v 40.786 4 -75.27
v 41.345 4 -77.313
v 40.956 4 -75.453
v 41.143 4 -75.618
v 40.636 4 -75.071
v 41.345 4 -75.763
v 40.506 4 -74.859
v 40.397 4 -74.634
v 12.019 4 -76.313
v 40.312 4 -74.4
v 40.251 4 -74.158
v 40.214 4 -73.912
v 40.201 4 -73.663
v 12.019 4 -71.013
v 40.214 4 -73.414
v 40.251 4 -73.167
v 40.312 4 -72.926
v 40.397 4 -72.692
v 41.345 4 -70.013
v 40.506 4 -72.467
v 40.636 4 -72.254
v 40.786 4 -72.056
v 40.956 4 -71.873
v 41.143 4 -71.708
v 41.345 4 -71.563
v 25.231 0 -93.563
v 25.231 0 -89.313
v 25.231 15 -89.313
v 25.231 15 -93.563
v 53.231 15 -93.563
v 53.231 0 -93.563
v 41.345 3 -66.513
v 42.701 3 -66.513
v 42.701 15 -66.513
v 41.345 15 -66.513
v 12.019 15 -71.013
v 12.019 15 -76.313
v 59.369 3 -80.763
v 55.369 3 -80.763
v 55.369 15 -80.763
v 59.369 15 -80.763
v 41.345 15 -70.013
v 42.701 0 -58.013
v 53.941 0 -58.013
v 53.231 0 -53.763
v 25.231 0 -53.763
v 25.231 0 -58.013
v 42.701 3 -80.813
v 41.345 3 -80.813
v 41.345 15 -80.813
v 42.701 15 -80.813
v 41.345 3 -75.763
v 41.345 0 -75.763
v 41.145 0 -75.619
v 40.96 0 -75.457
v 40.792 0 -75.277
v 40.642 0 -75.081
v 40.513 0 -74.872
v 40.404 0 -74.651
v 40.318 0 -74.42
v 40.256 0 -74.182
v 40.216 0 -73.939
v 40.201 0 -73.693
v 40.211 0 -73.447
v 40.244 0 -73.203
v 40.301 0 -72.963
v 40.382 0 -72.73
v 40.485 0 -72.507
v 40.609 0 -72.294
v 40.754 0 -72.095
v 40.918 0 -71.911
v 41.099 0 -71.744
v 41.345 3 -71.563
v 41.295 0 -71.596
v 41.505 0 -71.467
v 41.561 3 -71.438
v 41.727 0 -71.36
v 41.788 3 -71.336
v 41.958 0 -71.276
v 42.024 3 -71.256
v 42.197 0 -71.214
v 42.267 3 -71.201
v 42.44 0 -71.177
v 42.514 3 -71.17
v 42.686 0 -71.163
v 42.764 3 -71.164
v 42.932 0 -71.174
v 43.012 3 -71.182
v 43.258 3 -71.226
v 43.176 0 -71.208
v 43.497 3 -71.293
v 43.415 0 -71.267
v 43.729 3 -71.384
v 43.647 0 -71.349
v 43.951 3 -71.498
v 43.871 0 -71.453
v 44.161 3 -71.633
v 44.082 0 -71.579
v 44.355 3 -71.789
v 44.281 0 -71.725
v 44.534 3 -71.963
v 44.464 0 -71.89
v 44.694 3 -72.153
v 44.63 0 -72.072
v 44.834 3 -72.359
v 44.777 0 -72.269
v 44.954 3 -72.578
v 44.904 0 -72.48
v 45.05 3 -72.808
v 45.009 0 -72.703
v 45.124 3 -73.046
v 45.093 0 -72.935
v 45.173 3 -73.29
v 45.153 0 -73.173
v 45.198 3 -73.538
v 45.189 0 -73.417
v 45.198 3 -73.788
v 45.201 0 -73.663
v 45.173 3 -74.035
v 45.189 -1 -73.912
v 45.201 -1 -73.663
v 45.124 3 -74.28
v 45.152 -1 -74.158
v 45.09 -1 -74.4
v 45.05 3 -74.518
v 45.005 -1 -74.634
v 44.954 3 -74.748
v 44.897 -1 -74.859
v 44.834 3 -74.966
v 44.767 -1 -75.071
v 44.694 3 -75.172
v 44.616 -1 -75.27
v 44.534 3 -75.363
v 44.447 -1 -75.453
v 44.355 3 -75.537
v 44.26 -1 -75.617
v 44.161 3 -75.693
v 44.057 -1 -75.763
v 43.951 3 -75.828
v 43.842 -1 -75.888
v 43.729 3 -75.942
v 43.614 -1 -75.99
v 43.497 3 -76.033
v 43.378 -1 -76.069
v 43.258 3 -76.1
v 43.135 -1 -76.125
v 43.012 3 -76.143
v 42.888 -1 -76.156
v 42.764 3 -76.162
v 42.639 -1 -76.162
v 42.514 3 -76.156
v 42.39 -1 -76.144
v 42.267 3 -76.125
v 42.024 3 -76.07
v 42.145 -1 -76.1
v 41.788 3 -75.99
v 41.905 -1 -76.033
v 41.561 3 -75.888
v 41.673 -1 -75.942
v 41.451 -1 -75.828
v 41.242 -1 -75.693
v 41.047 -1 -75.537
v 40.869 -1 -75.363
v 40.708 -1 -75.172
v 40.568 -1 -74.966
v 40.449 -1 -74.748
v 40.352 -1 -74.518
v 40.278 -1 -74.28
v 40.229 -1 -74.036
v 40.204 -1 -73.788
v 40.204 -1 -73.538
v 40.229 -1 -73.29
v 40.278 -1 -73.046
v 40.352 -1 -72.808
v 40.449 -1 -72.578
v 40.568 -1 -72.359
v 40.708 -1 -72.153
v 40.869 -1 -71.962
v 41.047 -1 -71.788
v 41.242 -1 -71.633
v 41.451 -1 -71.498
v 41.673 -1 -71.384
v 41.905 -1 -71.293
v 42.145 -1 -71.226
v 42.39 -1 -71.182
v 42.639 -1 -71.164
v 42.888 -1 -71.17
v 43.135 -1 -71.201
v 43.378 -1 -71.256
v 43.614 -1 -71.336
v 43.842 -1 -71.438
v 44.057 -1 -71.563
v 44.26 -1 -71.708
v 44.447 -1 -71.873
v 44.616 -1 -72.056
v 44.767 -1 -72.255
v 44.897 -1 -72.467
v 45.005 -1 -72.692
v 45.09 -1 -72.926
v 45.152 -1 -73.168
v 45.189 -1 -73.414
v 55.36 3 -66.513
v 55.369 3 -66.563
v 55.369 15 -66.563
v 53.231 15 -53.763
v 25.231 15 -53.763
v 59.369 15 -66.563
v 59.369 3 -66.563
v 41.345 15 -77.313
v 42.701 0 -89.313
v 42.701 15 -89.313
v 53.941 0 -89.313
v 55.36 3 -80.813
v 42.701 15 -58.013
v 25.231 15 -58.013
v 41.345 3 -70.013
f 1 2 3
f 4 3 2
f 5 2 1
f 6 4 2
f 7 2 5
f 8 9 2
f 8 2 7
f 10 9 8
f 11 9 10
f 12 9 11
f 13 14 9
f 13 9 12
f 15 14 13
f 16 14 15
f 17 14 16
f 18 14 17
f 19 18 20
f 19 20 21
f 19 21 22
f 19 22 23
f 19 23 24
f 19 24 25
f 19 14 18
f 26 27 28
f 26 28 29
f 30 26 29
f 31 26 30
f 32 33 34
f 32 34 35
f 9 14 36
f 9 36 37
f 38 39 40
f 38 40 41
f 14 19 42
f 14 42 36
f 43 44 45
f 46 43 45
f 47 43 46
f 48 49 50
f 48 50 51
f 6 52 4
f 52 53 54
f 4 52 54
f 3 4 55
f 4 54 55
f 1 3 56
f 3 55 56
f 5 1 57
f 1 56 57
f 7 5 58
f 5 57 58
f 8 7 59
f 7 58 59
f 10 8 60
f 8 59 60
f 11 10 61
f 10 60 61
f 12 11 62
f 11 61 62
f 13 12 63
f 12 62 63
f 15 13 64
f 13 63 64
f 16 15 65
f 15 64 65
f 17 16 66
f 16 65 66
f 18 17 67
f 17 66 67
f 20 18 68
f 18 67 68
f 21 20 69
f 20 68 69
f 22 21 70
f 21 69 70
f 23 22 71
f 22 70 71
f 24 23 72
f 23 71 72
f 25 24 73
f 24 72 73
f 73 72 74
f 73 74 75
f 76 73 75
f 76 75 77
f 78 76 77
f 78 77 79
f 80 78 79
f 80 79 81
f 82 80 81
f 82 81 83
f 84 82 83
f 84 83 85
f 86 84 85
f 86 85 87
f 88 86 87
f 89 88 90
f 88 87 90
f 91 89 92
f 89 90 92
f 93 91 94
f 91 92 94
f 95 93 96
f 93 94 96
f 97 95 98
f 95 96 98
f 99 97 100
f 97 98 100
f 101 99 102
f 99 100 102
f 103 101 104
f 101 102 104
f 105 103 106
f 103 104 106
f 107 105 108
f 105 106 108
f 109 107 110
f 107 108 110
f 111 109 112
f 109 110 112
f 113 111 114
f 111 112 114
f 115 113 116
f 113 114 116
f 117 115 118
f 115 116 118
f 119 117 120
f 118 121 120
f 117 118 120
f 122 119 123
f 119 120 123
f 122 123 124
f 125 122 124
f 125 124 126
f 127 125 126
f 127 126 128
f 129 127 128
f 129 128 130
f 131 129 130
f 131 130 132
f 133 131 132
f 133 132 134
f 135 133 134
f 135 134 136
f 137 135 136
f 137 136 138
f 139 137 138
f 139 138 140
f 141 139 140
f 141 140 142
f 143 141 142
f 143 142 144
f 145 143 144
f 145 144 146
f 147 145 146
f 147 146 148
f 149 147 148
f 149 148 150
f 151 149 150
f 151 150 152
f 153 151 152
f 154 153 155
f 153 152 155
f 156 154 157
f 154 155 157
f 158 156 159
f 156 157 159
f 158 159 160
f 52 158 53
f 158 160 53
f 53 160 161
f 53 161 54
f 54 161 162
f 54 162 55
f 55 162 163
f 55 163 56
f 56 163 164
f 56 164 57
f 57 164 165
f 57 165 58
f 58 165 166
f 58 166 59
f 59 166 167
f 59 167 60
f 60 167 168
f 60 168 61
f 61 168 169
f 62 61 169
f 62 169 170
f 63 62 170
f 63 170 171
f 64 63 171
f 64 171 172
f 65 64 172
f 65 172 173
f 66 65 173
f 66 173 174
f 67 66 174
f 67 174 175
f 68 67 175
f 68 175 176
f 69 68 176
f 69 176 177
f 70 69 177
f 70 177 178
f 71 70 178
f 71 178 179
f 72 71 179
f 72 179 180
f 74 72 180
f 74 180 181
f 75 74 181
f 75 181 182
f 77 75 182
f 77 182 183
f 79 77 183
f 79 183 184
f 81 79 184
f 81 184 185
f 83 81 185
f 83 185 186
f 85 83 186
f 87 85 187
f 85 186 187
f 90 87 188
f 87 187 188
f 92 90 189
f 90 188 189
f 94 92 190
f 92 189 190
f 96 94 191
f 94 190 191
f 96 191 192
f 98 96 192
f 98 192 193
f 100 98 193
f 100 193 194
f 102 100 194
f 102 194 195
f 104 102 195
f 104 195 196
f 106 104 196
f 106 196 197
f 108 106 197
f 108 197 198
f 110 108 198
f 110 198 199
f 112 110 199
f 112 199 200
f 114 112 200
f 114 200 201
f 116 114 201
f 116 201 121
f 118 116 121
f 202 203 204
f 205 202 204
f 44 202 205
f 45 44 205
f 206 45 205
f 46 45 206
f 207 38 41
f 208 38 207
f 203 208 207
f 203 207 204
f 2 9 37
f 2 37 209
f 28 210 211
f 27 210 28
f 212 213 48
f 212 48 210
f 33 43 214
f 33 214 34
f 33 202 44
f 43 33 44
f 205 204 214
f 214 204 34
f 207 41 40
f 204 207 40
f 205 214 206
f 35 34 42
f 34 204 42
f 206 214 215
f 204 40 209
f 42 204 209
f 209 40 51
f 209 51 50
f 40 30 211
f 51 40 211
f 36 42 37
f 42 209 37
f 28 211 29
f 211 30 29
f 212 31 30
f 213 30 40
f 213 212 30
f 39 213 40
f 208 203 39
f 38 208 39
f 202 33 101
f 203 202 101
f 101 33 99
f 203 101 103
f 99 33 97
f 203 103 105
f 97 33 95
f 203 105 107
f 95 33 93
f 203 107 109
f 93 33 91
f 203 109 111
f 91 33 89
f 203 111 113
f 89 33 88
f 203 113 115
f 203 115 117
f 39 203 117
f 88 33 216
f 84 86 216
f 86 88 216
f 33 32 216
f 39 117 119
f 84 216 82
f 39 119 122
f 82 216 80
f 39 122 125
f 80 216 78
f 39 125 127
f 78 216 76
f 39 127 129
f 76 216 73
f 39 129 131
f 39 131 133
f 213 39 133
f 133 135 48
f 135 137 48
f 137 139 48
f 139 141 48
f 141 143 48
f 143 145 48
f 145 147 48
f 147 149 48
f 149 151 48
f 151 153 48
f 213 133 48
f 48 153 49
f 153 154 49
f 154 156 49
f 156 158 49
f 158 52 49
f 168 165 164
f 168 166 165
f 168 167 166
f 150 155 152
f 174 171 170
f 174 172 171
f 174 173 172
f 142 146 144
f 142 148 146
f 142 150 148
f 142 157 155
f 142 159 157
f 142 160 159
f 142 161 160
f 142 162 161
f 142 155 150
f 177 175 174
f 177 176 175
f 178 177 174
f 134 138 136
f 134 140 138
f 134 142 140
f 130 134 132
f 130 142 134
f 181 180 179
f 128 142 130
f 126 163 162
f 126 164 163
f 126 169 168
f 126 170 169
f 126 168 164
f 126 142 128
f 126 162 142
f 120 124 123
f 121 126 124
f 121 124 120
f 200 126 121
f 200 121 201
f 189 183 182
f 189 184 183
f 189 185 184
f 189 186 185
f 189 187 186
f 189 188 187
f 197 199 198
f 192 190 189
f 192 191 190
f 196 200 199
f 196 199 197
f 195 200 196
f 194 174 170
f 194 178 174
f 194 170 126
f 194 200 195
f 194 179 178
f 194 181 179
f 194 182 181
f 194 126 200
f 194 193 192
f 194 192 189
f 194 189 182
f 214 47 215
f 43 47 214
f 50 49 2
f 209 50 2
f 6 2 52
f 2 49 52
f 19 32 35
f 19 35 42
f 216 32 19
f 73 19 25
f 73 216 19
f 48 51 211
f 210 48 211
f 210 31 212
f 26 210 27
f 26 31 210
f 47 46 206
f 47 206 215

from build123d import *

# Parameters (mm, degrees)
BOSS_EXTRUDE1_DEPTH     = 15
SKETCH2_R               = 2.5
BOSS_EXTRUDE2_DEPTH     = 1
CUT_EXTRUDE1_DEPTH      = 3
CUT_EXTRUDE5_DEPTH      = 2
CUT_EXTRUDE5_DEPTH_BACK = 3
SKETCH5_W               = 1.356176493
SKETCH5_H               = 3
CUT_EXTRUDE6_DEPTH      = 3
CUT_EXTRUDE11_DEPTH     = 20
CUT_EXTRUDE12_DEPTH     = 1


with BuildPart() as part:
    # Sketch1 → Boss-Extrude1 (new body)
    with BuildSketch(Plane(origin=(0, 0, 0), x_dir=(1, 0, 0), z_dir=(0, 1, 0))):
        Polygon((53.231444905, 93.562909441), (55.368661466, 80.762909441), (59.368661466, 80.762909441), (59.368661466, 66.562909441), (55.368661466, 66.562909441), (53.231444905, 53.762909441), (25.231444905, 53.762909441), (25.231444905, 58.012909441), (42.701133317, 58.012909441), (42.701133317, 66.512909441), (41.344956824, 66.512909441), (41.344956824, 70.012909441), (12.018661466, 71.012909441), (12.018661466, 76.312909441), (41.344956824, 77.312909441), (41.344956824, 80.812909441), (42.701133317, 80.812909441), (42.701133317, 89.312909441), (25.231444905, 89.312909441), (25.231444905, 93.562909441), align=None)
    extrude(amount=BOSS_EXTRUDE1_DEPTH)

    # Sketch2 → Boss-Extrude2 (add)
    with BuildSketch(Plane.XZ):
        with Locations((42.701133317, -73.662909441)):
            Circle(SKETCH2_R)
    extrude(amount=BOSS_EXTRUDE2_DEPTH)

    # Sketch3 → Cut-Extrude1 (cut)
    with BuildSketch(Plane(origin=(0, 0, 0), x_dir=(-1, 0, 0), z_dir=(0, -1, 0))):
        with BuildLine():
            Line((-42.701133317, 80.812909441), (-55.368661466, 80.762909441))
            Line((-55.368661466, 80.762909441), (-59.368661466, 80.762909441))
            Line((-59.368661466, 80.762909441), (-59.368661466, 66.562909441))
            Line((-59.368661466, 66.562909441), (-41.344956824, 66.512909441))
            Line((-41.344956824, 66.512909441), (-41.344956824, 70.012909441))
            Line((-41.344956824, 70.012909441), (-41.344956824, 71.562722468))
            ThreePointArc((-41.344956824, 71.562722468), (-45.201133317, 73.662909441), (-41.344956824, 75.763096414))
            Line((-41.344956824, 75.763096414), (-41.344956824, 77.312909441))
            Line((-41.344956824, 77.312909441), (-41.344956824, 80.812909441))
            Line((-41.344956824, 80.812909441), (-42.701133317, 80.812909441))
        make_face()
    extrude(amount=-CUT_EXTRUDE1_DEPTH, mode=Mode.SUBTRACT)

    # Sketch4 → Cut-Extrude5 (cut, two sides)
    with BuildSketch(Plane.XZ) as cut_extrude5_sk:
        with BuildLine():
            Line((12.018661466, -76.312909441), (41.344956824, -77.312909441))
            Line((41.344956824, -77.312909441), (41.344956824, -77.220900459))
            Line((41.344956824, -77.220900459), (41.344956824, -75.763096414))
            ThreePointArc((41.344956824, -75.763096414), (40.201133317, -73.662909441), (41.344956824, -71.562722468))
            Line((41.344956824, -71.562722468), (41.344956824, -70.012909441))
            Line((41.344956824, -70.012909441), (12.018661466, -71.012909441))
            Line((12.018661466, -71.012909441), (12.018661466, -76.312909441))
        make_face()
    extrude(amount=CUT_EXTRUDE5_DEPTH, mode=Mode.SUBTRACT)
    extrude(cut_extrude5_sk.sketch, amount=-CUT_EXTRUDE5_DEPTH_BACK, mode=Mode.SUBTRACT)

    # Sketch5 → Cut-Extrude6 (cut)
    with BuildSketch(Plane.XY.offset(-66.512909441)):
        with Locations((42.023045071, 1.5)):
            Rectangle(SKETCH5_W, SKETCH5_H)
    extrude(amount=-CUT_EXTRUDE6_DEPTH, mode=Mode.SUBTRACT)

    # Sketch7 → Cut-Extrude11 (cut)
    with BuildSketch(Plane.ZY.offset(-42.701133317)):
        Polygon((-66.516671643, 0), (-67.290586566, 0), (-67.290586566, 3), (-66.512909441, 3), (-58.012909441, 0), align=None)
        Polygon((-89.312909441, 0), (-80.812909441, 0), (-79.713237651, 0), (-79.713237651, 3), (-80.812909441, 3), align=None)
    extrude(amount=-CUT_EXTRUDE11_DEPTH, mode=Mode.SUBTRACT)

    # Sketch11 → Cut-Extrude12 (cut)
    with BuildSketch(Plane.XZ.offset(-3)):
        with BuildLine():
            Line((41.344956824, -77.312909441), (41.344956824, -75.763096414))
            ThreePointArc((41.344956824, -75.763096414), (40.201133317, -73.662909441), (41.344956824, -71.562722468))
            Line((41.344956824, -71.562722468), (41.344956824, -70.012909441))
            Line((41.344956824, -70.012909441), (12.018661466, -71.012909441))
            Line((12.018661466, -71.012909441), (12.018661466, -76.312909441))
            Line((12.018661466, -76.312909441), (41.344956824, -77.312909441))
        make_face()
    extrude(amount=-CUT_EXTRUDE12_DEPTH, mode=Mode.SUBTRACT)


solid = part.part
